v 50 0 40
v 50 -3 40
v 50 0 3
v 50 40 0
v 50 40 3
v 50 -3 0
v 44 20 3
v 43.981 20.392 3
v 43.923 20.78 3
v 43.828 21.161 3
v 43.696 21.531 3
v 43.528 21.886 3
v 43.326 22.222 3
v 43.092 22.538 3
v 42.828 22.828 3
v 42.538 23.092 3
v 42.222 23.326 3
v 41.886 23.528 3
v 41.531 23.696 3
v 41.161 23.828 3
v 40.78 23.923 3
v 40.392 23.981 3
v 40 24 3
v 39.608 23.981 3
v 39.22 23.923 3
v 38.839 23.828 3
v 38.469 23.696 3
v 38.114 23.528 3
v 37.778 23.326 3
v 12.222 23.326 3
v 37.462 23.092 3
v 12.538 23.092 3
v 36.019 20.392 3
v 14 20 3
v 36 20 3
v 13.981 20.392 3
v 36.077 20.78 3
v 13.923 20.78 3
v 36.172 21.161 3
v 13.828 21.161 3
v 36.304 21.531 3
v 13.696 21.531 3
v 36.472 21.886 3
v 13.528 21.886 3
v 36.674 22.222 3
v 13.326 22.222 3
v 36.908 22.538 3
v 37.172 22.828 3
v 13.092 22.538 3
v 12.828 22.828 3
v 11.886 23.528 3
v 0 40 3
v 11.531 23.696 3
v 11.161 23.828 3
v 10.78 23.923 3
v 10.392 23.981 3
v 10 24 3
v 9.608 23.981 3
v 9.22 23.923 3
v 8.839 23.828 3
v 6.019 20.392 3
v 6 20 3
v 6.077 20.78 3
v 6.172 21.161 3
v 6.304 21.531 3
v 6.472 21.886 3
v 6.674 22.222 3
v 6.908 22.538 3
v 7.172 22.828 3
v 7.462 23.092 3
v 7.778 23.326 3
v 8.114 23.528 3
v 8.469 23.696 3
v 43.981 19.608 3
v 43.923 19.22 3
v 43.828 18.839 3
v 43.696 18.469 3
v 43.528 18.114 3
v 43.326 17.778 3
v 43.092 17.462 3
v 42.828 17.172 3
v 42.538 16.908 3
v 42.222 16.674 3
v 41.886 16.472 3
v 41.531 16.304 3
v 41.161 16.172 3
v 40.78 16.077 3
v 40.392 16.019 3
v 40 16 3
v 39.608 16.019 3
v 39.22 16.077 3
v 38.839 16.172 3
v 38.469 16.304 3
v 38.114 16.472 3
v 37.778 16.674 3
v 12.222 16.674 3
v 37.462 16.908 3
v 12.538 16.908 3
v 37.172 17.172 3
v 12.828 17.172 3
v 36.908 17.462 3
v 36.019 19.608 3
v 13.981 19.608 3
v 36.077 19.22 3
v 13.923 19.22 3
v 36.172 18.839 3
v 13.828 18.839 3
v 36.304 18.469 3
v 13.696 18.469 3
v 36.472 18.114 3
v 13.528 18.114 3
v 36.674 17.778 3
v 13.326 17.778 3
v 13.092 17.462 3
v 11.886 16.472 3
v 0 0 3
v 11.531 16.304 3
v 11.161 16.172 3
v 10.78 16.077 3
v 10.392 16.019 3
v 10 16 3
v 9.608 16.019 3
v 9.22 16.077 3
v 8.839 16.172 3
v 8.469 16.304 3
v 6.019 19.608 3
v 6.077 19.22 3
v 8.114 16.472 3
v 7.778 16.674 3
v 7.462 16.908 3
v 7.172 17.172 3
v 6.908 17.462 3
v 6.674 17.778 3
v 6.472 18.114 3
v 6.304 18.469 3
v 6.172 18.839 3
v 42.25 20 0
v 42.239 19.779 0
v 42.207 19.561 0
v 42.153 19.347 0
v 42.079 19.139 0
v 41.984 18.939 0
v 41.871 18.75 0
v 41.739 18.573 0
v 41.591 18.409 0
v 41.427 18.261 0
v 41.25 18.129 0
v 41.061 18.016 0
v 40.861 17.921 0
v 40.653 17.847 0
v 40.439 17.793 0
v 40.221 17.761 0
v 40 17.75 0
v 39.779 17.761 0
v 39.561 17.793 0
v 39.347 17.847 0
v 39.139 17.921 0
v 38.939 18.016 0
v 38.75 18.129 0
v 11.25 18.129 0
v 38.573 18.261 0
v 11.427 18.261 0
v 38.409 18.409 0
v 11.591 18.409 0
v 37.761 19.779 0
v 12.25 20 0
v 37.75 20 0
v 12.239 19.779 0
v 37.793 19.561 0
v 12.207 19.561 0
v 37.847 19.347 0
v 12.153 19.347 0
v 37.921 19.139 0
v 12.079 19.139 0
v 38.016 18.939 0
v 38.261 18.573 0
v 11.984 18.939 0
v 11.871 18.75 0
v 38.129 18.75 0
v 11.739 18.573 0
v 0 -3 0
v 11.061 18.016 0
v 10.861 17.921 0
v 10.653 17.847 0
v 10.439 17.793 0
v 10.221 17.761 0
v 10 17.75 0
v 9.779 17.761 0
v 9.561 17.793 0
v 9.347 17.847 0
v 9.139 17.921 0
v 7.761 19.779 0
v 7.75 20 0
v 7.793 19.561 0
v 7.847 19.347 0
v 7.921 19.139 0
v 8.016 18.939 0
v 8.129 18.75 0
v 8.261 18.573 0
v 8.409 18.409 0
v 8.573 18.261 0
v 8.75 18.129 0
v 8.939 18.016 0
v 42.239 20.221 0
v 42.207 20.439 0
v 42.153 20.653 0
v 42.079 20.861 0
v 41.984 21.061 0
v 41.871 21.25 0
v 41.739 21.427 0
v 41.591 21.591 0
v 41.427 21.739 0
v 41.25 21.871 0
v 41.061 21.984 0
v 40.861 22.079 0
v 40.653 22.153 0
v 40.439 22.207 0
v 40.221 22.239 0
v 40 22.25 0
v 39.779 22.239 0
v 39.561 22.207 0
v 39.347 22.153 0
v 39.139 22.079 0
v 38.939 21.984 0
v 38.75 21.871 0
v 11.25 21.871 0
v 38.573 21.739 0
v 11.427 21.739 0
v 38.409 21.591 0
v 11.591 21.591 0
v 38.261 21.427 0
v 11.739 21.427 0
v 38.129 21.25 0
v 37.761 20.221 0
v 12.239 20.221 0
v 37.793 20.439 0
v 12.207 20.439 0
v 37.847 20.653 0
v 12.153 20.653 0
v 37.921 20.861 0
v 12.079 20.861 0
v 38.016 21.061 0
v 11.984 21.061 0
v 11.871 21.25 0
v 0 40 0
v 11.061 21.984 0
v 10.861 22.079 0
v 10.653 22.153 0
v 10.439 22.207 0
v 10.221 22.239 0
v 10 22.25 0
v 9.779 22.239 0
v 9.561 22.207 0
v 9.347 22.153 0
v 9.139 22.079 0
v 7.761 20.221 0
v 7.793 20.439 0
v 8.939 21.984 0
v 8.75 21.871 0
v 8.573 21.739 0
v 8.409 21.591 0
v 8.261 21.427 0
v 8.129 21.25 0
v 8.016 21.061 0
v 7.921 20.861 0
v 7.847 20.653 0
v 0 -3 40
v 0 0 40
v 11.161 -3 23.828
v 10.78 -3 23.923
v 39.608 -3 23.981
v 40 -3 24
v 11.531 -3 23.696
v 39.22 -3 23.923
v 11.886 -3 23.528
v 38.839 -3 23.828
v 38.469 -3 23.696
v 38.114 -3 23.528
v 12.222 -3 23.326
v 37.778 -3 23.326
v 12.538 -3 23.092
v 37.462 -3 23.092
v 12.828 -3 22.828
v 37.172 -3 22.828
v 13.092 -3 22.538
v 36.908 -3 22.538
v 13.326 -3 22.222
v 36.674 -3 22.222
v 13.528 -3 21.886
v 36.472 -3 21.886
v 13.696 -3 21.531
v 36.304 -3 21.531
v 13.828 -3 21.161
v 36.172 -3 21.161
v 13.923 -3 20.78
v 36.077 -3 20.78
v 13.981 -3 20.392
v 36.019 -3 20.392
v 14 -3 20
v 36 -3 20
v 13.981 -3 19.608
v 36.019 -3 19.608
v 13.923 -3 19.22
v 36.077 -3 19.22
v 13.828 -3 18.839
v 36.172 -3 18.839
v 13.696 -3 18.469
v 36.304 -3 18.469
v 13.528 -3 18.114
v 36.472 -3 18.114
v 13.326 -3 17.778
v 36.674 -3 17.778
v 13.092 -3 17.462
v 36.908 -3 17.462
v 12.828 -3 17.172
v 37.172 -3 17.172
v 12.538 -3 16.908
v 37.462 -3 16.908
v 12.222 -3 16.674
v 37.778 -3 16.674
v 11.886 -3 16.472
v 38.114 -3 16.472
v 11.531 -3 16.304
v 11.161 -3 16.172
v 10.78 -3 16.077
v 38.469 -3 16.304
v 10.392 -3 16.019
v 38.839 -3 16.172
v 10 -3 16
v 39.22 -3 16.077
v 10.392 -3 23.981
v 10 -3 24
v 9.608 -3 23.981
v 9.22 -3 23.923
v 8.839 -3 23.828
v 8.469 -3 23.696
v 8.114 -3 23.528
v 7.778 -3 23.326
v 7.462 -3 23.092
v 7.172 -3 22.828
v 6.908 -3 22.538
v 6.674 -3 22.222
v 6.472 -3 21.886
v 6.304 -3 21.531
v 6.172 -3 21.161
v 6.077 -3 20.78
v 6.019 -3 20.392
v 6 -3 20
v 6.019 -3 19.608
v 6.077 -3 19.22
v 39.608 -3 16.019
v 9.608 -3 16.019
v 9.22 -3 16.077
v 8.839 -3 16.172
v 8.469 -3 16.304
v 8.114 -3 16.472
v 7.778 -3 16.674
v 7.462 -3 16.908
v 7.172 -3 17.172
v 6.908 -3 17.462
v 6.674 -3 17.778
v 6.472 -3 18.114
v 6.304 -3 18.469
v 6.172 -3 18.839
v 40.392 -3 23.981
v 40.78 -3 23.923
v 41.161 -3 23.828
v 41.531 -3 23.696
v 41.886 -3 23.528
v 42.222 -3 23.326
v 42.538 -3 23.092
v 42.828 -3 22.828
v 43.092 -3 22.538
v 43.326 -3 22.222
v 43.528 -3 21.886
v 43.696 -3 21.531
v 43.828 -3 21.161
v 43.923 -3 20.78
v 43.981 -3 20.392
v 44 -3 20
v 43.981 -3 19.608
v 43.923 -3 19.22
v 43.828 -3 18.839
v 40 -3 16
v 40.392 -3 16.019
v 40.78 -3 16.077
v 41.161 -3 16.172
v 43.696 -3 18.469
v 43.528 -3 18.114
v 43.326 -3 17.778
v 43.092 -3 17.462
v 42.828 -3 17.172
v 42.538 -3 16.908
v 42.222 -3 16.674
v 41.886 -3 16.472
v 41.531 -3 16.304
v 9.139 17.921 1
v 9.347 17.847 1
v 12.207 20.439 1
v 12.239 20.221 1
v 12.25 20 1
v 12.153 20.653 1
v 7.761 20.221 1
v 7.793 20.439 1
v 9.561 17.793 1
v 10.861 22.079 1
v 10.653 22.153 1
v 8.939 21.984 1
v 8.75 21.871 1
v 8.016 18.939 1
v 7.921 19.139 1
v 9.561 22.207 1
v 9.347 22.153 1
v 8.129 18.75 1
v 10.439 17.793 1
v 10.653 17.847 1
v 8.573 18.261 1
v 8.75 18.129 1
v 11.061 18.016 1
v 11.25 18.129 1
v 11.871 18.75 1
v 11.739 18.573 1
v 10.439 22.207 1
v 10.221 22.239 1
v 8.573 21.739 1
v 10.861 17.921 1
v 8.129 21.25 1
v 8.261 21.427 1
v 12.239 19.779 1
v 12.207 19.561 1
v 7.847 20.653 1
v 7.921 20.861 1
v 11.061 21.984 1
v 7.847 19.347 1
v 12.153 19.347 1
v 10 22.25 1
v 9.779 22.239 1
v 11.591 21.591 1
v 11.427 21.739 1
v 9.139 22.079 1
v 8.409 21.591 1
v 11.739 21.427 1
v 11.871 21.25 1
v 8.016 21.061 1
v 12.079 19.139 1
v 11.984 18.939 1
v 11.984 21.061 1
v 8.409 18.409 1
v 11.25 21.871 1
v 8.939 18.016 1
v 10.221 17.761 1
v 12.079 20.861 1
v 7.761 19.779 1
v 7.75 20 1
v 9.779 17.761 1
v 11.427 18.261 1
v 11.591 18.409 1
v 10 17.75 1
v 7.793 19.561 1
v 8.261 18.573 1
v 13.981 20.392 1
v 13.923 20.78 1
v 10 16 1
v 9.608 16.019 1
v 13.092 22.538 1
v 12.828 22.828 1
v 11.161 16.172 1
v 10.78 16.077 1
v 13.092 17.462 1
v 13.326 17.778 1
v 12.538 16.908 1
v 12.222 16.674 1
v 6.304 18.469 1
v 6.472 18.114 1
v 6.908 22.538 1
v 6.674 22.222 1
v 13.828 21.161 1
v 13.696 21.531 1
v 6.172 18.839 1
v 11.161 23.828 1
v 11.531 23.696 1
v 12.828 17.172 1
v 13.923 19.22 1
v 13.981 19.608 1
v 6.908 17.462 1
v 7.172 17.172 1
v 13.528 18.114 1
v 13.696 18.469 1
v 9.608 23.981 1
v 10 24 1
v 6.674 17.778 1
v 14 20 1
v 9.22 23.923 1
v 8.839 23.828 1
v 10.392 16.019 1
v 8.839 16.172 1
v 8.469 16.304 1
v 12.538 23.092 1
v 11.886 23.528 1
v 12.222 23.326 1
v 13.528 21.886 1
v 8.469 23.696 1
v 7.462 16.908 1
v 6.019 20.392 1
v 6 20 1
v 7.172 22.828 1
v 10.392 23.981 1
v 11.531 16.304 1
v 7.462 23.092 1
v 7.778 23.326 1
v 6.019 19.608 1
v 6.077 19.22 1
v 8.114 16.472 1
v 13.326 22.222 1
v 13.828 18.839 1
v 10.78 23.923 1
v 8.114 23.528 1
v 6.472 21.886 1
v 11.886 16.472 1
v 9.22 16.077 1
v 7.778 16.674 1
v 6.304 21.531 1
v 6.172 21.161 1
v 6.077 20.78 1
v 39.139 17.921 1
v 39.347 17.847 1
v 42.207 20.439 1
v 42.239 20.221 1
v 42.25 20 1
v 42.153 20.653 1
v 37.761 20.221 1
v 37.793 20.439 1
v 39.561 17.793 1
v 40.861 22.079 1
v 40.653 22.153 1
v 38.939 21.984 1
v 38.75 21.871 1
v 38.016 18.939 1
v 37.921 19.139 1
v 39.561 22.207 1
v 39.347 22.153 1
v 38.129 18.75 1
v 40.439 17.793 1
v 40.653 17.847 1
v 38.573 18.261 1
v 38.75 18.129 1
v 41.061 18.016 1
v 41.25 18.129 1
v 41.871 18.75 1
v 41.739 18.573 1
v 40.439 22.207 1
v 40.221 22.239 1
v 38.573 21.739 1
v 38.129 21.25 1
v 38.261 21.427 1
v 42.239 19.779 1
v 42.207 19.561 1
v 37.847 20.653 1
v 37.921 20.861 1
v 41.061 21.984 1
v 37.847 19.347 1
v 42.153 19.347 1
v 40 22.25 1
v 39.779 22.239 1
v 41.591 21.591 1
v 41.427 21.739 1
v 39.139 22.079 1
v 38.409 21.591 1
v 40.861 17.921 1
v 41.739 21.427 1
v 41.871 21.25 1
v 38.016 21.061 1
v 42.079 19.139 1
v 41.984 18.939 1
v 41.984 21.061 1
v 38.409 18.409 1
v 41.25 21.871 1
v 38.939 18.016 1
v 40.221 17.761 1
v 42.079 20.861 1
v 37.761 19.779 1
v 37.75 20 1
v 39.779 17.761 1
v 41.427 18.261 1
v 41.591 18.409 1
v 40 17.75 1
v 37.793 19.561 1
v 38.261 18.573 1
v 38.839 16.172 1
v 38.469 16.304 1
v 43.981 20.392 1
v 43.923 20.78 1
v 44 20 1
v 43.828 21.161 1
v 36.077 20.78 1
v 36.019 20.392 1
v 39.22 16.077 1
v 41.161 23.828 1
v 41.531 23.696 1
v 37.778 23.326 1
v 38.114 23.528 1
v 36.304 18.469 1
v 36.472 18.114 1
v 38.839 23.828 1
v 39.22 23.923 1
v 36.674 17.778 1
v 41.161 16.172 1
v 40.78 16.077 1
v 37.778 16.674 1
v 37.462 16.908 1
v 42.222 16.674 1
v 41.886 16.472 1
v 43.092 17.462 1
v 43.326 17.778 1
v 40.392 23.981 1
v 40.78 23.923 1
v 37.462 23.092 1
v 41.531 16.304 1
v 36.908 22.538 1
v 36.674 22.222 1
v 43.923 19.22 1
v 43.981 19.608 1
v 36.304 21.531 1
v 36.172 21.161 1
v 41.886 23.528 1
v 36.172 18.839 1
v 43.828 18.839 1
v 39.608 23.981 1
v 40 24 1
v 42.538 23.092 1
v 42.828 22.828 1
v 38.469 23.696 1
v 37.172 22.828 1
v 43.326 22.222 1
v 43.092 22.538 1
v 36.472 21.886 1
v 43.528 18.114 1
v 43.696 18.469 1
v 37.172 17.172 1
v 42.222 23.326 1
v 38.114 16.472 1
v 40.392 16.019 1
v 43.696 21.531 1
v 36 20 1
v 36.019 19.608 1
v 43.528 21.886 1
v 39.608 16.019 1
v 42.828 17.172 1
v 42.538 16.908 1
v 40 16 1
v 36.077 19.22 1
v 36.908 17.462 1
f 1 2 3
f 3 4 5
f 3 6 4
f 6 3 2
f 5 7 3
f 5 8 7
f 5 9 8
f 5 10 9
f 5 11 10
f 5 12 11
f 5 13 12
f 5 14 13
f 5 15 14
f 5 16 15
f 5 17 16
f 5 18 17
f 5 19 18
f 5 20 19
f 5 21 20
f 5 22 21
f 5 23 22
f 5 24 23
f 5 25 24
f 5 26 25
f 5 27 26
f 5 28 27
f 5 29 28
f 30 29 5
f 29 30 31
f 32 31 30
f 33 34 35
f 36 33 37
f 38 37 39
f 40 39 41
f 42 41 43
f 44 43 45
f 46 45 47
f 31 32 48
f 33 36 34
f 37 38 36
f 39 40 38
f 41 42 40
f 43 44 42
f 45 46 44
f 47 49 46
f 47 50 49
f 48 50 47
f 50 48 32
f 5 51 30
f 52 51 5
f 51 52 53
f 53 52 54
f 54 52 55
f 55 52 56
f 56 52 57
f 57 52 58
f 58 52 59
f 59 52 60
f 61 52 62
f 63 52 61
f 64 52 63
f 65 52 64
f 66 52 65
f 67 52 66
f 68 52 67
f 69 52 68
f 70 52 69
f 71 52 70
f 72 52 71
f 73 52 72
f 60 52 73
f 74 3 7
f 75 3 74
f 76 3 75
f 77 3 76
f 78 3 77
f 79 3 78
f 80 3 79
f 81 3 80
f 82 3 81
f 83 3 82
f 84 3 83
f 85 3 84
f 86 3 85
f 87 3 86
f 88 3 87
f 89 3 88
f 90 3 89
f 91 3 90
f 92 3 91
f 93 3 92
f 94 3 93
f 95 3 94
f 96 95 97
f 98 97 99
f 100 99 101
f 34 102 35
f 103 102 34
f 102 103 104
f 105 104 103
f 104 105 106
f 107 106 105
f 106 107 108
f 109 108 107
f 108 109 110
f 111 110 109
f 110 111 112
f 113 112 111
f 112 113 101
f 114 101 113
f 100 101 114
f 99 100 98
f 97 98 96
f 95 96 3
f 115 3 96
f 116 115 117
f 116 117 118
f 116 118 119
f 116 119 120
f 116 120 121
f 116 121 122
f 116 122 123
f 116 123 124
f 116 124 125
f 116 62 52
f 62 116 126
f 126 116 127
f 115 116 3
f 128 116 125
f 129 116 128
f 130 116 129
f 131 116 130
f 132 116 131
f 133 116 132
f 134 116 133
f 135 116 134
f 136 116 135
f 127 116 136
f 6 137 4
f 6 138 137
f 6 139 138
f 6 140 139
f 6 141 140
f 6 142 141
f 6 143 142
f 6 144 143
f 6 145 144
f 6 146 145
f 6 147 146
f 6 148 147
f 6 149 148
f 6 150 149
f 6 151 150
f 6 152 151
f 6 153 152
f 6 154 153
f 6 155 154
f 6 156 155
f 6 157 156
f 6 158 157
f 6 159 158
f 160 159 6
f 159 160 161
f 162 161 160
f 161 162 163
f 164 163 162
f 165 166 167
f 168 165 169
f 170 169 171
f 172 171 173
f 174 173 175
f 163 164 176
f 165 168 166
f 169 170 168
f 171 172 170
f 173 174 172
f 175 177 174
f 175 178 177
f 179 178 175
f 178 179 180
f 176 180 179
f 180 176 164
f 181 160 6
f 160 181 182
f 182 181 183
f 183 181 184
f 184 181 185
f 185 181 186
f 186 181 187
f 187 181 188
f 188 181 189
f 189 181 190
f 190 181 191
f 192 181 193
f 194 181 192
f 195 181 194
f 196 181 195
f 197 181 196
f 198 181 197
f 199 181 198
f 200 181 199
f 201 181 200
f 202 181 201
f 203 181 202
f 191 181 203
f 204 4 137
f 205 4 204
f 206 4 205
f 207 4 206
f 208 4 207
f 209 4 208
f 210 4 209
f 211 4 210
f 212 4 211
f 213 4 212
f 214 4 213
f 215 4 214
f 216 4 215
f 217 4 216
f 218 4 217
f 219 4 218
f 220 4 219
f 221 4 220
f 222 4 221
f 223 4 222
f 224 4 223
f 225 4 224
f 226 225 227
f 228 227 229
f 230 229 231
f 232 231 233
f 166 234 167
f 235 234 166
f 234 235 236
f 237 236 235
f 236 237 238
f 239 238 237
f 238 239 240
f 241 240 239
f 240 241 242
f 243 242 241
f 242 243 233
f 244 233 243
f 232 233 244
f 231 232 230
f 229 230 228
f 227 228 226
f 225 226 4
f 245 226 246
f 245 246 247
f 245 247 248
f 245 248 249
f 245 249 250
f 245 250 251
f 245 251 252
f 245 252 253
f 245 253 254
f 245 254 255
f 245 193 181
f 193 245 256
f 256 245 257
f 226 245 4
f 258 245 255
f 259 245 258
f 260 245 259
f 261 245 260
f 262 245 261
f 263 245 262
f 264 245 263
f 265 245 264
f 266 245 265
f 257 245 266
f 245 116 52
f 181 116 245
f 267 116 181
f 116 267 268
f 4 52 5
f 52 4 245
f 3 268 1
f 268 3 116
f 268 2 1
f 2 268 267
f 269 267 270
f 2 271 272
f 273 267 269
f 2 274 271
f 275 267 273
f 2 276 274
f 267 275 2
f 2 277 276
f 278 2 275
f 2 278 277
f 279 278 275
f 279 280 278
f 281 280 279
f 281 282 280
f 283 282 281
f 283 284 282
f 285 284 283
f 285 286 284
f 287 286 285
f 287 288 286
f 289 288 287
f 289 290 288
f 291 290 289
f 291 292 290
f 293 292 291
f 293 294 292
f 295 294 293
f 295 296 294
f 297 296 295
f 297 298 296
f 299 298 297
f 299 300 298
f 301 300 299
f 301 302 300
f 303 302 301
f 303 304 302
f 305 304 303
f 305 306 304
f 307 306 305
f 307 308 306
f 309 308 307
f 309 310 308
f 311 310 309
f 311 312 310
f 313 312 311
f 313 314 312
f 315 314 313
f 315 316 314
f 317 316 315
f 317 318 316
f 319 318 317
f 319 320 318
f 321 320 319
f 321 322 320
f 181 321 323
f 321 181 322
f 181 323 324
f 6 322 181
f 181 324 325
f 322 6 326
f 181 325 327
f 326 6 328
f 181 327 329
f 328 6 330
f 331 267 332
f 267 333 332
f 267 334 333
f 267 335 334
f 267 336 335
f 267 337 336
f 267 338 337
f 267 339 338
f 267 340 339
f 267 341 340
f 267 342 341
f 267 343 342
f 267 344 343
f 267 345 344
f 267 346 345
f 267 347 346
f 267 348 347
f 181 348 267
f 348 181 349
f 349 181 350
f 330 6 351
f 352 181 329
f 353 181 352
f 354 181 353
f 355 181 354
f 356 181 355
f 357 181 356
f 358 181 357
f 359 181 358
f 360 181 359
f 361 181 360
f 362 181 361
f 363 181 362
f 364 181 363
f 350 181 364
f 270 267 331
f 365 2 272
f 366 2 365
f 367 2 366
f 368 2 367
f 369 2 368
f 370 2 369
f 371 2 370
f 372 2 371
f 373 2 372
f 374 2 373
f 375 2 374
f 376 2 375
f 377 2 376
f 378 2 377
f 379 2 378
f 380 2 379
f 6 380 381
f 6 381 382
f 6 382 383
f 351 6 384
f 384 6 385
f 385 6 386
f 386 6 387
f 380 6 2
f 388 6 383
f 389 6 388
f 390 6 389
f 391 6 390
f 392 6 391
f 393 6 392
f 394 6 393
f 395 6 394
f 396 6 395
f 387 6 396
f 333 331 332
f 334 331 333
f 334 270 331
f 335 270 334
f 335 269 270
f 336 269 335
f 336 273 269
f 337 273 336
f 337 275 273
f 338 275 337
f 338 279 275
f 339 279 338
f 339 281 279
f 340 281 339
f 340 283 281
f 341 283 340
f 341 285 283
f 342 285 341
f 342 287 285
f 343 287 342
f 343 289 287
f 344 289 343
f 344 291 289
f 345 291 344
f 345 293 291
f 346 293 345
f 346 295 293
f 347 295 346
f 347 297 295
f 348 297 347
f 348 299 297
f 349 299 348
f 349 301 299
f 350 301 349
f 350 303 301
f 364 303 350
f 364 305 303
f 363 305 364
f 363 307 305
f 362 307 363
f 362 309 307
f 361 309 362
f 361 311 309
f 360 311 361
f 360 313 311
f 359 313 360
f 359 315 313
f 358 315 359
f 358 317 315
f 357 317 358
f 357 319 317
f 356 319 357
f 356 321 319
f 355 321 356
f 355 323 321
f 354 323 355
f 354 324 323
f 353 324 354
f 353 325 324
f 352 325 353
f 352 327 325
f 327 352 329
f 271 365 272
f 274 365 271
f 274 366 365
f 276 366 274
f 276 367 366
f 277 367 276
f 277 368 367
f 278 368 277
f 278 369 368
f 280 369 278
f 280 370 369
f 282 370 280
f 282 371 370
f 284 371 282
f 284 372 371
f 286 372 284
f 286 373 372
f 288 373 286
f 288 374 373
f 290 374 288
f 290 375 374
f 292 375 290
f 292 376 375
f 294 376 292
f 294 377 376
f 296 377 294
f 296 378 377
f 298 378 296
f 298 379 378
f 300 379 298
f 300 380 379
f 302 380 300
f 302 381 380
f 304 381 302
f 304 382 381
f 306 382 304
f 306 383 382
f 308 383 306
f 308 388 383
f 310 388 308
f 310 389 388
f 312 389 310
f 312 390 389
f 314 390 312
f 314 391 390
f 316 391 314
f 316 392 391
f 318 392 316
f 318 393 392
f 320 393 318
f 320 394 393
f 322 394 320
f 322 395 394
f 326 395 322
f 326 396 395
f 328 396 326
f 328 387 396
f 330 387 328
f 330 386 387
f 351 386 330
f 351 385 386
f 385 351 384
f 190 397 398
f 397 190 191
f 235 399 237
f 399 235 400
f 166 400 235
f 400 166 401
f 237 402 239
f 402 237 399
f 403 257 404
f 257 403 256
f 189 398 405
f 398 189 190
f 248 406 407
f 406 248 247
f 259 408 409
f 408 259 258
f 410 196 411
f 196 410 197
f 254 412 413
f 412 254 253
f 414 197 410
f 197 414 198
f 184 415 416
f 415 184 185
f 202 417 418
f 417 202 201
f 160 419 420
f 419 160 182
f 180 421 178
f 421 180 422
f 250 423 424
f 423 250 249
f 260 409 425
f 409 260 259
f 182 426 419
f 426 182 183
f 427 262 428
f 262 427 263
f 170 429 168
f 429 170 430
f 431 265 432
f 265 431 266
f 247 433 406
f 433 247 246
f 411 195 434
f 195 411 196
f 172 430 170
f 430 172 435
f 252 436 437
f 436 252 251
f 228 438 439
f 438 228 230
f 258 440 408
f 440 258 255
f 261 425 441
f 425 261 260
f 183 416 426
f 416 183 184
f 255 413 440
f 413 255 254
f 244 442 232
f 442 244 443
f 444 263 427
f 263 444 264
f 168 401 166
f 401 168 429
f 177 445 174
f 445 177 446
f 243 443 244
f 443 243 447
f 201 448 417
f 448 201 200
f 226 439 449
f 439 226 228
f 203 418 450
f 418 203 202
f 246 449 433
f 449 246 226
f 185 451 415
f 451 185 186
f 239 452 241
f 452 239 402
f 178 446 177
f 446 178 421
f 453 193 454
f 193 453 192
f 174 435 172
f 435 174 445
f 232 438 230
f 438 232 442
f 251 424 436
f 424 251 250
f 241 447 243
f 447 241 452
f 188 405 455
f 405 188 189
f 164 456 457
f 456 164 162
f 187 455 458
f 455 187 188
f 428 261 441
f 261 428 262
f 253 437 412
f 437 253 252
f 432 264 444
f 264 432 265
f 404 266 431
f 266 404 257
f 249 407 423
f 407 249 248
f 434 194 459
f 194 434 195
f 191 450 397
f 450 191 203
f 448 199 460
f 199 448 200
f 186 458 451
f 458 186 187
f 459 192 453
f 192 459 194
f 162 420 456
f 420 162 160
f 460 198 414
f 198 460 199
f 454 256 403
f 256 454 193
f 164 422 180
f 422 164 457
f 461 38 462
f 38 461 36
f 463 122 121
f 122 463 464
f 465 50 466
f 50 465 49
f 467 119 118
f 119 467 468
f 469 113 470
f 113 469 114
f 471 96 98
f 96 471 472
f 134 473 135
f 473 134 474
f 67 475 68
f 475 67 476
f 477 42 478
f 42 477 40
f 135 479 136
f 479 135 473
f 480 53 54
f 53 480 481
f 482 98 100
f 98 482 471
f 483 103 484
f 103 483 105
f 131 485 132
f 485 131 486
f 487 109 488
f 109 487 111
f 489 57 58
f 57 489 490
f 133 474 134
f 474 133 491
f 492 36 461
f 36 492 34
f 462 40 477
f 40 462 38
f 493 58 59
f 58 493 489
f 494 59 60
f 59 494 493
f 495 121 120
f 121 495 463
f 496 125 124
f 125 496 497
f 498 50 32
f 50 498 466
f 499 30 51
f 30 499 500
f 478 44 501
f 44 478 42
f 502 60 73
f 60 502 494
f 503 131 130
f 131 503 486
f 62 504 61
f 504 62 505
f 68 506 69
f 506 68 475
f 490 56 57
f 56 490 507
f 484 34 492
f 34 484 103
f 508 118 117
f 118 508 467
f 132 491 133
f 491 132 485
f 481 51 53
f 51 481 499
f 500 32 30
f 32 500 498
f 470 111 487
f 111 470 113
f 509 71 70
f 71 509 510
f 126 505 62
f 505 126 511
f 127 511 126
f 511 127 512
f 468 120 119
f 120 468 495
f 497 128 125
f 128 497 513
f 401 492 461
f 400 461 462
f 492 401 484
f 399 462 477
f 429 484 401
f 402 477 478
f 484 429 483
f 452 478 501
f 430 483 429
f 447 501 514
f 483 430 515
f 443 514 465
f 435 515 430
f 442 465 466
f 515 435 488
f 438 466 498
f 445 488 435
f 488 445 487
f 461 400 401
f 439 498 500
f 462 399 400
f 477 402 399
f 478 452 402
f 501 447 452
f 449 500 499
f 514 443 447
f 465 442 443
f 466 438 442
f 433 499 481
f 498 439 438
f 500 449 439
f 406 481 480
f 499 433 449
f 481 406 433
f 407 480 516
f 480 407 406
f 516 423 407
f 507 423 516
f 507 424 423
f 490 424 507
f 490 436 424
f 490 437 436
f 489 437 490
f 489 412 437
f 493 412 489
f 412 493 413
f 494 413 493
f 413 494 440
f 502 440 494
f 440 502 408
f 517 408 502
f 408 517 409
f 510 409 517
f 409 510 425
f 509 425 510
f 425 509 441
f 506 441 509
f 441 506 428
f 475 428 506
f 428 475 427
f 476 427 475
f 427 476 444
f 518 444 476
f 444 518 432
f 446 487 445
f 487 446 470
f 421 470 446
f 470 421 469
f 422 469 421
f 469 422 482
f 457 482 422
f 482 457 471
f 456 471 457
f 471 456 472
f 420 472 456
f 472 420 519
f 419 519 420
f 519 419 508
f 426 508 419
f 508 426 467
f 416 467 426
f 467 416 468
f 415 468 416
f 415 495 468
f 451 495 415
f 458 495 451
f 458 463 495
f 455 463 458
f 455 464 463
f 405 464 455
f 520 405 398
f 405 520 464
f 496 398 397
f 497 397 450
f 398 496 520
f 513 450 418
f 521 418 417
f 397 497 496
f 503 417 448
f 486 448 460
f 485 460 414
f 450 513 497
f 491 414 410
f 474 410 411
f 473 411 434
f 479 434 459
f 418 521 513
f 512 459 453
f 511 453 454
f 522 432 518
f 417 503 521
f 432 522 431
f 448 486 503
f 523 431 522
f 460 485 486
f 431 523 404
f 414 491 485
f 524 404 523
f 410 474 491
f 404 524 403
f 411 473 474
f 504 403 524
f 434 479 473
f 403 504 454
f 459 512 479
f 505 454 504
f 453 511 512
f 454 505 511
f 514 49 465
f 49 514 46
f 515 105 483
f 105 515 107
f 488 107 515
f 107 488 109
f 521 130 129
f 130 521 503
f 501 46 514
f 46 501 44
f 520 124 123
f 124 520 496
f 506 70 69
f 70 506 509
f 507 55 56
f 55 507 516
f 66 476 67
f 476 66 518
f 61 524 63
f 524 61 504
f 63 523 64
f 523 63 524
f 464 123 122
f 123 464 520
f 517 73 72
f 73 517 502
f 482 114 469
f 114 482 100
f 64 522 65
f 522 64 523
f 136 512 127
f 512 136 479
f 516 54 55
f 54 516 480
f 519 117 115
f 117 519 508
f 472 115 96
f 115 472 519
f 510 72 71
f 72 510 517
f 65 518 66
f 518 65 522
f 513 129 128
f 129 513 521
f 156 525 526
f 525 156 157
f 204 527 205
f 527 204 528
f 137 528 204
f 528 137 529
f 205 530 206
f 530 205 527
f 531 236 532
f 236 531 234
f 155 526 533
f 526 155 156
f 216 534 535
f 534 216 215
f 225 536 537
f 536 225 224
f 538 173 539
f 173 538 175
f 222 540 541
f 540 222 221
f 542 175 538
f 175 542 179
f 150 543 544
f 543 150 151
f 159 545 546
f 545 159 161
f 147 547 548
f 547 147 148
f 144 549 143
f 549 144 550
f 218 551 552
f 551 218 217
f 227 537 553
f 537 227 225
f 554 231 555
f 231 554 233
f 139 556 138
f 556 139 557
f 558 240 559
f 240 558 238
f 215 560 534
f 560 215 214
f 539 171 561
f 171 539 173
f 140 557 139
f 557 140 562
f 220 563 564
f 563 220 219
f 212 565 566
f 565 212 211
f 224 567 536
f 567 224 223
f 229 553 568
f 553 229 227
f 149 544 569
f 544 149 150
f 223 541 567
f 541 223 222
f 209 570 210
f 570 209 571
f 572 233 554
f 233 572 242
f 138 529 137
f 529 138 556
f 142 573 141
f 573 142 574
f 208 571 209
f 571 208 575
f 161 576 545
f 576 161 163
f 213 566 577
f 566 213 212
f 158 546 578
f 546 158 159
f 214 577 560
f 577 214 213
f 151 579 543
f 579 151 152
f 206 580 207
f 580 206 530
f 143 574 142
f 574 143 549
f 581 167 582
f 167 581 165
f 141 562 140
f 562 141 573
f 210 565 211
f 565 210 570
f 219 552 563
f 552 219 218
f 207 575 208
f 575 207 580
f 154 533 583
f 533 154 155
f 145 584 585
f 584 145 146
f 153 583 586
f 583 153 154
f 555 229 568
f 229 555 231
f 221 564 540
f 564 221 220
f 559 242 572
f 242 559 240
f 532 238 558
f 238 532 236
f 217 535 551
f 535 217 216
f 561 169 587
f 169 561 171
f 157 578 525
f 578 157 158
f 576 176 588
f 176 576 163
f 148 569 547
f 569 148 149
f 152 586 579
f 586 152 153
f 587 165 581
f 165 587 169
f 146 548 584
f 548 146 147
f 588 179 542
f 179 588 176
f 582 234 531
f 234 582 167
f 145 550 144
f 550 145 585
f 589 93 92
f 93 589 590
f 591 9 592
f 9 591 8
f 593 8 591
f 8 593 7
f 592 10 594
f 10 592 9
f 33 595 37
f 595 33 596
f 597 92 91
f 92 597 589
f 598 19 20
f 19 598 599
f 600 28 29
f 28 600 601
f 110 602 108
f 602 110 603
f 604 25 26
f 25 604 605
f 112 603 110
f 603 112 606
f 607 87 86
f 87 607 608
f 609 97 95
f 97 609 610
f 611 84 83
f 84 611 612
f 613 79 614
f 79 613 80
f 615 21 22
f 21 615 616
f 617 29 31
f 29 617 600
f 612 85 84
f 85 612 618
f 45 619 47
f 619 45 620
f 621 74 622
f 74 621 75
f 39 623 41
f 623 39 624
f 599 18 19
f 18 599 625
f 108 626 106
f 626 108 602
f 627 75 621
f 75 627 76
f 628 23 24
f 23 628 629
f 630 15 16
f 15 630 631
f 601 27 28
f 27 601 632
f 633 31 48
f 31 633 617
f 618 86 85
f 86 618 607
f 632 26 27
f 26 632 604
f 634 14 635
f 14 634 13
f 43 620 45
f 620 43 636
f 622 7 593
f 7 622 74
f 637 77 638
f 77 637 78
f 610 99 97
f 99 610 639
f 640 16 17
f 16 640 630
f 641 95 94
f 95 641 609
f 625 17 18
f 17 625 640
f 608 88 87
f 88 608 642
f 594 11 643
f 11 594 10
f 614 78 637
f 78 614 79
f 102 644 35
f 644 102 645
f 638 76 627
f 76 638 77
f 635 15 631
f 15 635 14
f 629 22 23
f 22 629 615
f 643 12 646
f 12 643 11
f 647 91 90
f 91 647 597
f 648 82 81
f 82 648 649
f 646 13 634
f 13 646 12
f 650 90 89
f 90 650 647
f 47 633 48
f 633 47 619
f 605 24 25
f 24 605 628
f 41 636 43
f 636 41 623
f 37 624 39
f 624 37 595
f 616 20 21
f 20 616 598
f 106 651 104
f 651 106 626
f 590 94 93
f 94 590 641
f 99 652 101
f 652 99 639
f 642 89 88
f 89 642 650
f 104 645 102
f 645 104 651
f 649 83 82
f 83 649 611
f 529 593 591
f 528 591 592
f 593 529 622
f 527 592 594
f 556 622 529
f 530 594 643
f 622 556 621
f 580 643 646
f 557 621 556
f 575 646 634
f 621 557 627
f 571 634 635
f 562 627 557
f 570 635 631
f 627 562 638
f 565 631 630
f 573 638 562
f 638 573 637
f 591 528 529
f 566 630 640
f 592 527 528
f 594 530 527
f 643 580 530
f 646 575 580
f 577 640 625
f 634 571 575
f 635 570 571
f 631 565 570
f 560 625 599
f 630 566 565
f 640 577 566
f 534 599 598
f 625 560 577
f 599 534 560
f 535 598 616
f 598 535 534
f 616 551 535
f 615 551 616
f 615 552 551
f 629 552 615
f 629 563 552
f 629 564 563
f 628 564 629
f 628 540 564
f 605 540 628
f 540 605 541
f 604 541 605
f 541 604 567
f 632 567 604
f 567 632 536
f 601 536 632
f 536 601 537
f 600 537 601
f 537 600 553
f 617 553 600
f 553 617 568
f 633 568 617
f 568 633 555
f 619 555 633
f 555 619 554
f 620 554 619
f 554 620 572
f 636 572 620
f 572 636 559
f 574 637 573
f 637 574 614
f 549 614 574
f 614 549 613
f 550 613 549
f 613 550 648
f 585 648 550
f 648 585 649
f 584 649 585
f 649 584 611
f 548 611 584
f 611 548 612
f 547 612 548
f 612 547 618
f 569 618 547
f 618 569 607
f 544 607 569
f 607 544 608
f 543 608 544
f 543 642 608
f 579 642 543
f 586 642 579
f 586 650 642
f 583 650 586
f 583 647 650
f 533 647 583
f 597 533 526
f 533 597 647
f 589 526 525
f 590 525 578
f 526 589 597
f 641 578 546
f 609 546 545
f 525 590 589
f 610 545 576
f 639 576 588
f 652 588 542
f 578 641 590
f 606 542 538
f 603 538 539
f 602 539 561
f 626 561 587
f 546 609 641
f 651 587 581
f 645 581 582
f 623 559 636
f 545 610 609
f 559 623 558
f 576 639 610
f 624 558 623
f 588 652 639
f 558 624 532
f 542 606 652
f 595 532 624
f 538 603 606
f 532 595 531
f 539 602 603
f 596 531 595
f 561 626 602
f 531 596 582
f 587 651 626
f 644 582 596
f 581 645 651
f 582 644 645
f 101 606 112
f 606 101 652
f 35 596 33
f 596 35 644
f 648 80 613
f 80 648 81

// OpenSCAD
// L-bracket with countersunk M4 holes
//------------------------------------------------
WIDTH       = 50;   // common width of both flanges (X)
DEPTH       = 40;   // depth of horizontal flange   (Y)
HEIGHT      = 40;   // height of  vertical flange   (Z)
THK         = 3;    // plate thickness

// Hole parameters
HOLE_D      = 4.5;  // through-hole diameter (M4 clearance)
CSK_D       = 8;    // countersink seat diameter
CSK_DEPTH   = 2;    // countersink depth
EDGE_OFF    = 10;   // distance of hole centres from left/right edges
$fn         = 64;   // circle quality

// Small extra length for subtraction robustness
EPS = 0.2;

//------------------------------------------------
difference() {

    // ----- plates ---------------------------------------------------------
    union() {
        // horizontal flange (XY plane, thickness +Z)
        cube([WIDTH, DEPTH, THK], center = false);

        // vertical flange (XZ plane, thickness –Y)
        translate([0, -THK, 0])
            cube([WIDTH, THK, HEIGHT], center = false);
    }

    // ----- holes ----------------------------------------------------------

    // horizontal flange holes (axis = Z)
    for (x = [EDGE_OFF, WIDTH - EDGE_OFF]) {
        y = DEPTH / 2;

        // through-hole
        translate([x, y, -EPS])
            cylinder(h = THK + 2*EPS, d = HOLE_D);

        // countersink (from top surface downward)
        translate([x, y, THK - CSK_DEPTH])
            cylinder(h = CSK_DEPTH, d = CSK_D);
    }

    // vertical flange holes (axis = Y)
    for (x = [EDGE_OFF, WIDTH - EDGE_OFF]) {
        z = HEIGHT / 2;

        // through-hole
        translate([x, -THK - EPS, z])
            rotate([90, 0, 0])
                cylinder(h = THK + 2*EPS, d = HOLE_D);

        // countersink (from outer face inward)
        translate([x, -THK, z])
            rotate([90, 0, 0])
                cylinder(h = CSK_DEPTH, d = CSK_D);
    }
}
